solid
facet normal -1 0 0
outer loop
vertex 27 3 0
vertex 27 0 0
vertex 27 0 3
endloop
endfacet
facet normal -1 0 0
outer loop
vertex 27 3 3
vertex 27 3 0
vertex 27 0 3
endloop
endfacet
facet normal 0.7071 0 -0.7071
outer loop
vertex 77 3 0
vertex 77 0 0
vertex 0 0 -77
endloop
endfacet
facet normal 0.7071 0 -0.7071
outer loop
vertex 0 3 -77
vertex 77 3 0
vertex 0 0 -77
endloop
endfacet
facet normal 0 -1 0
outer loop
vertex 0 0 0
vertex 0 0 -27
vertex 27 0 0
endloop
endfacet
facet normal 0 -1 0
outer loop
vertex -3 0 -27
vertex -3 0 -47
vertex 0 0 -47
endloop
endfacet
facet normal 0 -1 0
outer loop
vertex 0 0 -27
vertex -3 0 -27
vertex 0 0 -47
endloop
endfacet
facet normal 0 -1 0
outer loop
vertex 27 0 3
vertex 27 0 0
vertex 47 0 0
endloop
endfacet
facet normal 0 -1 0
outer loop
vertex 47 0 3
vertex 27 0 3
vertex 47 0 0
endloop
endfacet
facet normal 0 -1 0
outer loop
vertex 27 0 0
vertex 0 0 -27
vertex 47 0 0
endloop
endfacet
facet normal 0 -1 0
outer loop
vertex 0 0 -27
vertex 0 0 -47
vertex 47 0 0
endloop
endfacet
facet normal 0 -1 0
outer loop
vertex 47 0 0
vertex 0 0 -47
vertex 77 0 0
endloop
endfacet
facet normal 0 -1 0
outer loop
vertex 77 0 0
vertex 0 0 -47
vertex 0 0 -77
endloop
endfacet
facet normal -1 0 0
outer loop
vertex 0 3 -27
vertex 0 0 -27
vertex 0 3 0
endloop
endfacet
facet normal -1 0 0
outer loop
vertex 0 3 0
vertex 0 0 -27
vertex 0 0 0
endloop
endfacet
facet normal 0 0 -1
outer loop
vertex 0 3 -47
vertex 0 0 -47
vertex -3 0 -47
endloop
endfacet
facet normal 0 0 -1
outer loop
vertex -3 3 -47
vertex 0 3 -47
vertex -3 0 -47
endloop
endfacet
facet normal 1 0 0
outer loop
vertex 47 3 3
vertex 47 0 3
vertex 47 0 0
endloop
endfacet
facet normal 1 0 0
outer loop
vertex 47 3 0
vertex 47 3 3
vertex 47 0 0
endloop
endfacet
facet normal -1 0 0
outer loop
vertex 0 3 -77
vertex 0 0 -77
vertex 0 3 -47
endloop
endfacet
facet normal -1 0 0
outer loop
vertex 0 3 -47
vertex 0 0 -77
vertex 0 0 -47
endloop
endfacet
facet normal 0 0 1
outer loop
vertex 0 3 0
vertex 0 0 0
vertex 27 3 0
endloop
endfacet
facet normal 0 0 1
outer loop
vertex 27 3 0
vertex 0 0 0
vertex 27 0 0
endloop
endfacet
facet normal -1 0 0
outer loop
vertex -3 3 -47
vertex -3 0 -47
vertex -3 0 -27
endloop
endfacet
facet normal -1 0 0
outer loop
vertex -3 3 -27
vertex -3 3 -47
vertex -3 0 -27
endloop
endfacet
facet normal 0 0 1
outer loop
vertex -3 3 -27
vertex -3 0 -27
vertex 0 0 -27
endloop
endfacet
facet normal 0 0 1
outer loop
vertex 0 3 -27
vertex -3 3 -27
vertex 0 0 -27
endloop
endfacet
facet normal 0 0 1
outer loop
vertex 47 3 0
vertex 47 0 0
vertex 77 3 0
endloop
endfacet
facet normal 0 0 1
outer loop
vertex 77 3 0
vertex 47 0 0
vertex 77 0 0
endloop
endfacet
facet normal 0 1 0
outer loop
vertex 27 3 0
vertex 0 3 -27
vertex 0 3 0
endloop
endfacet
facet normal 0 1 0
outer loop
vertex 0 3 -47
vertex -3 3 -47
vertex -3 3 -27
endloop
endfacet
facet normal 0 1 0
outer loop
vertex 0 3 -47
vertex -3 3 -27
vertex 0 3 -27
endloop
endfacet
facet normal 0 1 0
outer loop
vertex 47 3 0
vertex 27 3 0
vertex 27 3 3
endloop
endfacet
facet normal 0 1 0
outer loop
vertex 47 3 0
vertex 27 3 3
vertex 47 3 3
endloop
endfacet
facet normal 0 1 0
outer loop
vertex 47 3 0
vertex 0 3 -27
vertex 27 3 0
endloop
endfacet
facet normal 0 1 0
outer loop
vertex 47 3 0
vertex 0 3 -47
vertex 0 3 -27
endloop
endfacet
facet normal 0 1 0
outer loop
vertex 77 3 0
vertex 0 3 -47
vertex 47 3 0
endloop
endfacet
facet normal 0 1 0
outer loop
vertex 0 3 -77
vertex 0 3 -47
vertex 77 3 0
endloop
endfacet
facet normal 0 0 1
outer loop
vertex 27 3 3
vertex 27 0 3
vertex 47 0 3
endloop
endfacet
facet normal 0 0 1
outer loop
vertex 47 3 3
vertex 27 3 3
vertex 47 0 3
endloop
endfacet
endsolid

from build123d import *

# Parameters (mm, degrees)
SALIENTE_EXTRUIR1_DEPTH = 3


with BuildPart() as part:
    # Croquis1 → Saliente-Extruir1 (new body)
    with BuildSketch(Plane(origin=(0, 0, 0), x_dir=(1, 0, 0), z_dir=(0, 1, 0))):
        Polygon((0, 0), (27, 0), (27, -3), (37, -3), (47, -3), (47, 0), (77, 0), (0, 77), (0, 47), (-3, 47), (-3, 37), (-3, 27), (0, 27), align=None)
    extrude(amount=SALIENTE_EXTRUIR1_DEPTH)


solid = part.part
